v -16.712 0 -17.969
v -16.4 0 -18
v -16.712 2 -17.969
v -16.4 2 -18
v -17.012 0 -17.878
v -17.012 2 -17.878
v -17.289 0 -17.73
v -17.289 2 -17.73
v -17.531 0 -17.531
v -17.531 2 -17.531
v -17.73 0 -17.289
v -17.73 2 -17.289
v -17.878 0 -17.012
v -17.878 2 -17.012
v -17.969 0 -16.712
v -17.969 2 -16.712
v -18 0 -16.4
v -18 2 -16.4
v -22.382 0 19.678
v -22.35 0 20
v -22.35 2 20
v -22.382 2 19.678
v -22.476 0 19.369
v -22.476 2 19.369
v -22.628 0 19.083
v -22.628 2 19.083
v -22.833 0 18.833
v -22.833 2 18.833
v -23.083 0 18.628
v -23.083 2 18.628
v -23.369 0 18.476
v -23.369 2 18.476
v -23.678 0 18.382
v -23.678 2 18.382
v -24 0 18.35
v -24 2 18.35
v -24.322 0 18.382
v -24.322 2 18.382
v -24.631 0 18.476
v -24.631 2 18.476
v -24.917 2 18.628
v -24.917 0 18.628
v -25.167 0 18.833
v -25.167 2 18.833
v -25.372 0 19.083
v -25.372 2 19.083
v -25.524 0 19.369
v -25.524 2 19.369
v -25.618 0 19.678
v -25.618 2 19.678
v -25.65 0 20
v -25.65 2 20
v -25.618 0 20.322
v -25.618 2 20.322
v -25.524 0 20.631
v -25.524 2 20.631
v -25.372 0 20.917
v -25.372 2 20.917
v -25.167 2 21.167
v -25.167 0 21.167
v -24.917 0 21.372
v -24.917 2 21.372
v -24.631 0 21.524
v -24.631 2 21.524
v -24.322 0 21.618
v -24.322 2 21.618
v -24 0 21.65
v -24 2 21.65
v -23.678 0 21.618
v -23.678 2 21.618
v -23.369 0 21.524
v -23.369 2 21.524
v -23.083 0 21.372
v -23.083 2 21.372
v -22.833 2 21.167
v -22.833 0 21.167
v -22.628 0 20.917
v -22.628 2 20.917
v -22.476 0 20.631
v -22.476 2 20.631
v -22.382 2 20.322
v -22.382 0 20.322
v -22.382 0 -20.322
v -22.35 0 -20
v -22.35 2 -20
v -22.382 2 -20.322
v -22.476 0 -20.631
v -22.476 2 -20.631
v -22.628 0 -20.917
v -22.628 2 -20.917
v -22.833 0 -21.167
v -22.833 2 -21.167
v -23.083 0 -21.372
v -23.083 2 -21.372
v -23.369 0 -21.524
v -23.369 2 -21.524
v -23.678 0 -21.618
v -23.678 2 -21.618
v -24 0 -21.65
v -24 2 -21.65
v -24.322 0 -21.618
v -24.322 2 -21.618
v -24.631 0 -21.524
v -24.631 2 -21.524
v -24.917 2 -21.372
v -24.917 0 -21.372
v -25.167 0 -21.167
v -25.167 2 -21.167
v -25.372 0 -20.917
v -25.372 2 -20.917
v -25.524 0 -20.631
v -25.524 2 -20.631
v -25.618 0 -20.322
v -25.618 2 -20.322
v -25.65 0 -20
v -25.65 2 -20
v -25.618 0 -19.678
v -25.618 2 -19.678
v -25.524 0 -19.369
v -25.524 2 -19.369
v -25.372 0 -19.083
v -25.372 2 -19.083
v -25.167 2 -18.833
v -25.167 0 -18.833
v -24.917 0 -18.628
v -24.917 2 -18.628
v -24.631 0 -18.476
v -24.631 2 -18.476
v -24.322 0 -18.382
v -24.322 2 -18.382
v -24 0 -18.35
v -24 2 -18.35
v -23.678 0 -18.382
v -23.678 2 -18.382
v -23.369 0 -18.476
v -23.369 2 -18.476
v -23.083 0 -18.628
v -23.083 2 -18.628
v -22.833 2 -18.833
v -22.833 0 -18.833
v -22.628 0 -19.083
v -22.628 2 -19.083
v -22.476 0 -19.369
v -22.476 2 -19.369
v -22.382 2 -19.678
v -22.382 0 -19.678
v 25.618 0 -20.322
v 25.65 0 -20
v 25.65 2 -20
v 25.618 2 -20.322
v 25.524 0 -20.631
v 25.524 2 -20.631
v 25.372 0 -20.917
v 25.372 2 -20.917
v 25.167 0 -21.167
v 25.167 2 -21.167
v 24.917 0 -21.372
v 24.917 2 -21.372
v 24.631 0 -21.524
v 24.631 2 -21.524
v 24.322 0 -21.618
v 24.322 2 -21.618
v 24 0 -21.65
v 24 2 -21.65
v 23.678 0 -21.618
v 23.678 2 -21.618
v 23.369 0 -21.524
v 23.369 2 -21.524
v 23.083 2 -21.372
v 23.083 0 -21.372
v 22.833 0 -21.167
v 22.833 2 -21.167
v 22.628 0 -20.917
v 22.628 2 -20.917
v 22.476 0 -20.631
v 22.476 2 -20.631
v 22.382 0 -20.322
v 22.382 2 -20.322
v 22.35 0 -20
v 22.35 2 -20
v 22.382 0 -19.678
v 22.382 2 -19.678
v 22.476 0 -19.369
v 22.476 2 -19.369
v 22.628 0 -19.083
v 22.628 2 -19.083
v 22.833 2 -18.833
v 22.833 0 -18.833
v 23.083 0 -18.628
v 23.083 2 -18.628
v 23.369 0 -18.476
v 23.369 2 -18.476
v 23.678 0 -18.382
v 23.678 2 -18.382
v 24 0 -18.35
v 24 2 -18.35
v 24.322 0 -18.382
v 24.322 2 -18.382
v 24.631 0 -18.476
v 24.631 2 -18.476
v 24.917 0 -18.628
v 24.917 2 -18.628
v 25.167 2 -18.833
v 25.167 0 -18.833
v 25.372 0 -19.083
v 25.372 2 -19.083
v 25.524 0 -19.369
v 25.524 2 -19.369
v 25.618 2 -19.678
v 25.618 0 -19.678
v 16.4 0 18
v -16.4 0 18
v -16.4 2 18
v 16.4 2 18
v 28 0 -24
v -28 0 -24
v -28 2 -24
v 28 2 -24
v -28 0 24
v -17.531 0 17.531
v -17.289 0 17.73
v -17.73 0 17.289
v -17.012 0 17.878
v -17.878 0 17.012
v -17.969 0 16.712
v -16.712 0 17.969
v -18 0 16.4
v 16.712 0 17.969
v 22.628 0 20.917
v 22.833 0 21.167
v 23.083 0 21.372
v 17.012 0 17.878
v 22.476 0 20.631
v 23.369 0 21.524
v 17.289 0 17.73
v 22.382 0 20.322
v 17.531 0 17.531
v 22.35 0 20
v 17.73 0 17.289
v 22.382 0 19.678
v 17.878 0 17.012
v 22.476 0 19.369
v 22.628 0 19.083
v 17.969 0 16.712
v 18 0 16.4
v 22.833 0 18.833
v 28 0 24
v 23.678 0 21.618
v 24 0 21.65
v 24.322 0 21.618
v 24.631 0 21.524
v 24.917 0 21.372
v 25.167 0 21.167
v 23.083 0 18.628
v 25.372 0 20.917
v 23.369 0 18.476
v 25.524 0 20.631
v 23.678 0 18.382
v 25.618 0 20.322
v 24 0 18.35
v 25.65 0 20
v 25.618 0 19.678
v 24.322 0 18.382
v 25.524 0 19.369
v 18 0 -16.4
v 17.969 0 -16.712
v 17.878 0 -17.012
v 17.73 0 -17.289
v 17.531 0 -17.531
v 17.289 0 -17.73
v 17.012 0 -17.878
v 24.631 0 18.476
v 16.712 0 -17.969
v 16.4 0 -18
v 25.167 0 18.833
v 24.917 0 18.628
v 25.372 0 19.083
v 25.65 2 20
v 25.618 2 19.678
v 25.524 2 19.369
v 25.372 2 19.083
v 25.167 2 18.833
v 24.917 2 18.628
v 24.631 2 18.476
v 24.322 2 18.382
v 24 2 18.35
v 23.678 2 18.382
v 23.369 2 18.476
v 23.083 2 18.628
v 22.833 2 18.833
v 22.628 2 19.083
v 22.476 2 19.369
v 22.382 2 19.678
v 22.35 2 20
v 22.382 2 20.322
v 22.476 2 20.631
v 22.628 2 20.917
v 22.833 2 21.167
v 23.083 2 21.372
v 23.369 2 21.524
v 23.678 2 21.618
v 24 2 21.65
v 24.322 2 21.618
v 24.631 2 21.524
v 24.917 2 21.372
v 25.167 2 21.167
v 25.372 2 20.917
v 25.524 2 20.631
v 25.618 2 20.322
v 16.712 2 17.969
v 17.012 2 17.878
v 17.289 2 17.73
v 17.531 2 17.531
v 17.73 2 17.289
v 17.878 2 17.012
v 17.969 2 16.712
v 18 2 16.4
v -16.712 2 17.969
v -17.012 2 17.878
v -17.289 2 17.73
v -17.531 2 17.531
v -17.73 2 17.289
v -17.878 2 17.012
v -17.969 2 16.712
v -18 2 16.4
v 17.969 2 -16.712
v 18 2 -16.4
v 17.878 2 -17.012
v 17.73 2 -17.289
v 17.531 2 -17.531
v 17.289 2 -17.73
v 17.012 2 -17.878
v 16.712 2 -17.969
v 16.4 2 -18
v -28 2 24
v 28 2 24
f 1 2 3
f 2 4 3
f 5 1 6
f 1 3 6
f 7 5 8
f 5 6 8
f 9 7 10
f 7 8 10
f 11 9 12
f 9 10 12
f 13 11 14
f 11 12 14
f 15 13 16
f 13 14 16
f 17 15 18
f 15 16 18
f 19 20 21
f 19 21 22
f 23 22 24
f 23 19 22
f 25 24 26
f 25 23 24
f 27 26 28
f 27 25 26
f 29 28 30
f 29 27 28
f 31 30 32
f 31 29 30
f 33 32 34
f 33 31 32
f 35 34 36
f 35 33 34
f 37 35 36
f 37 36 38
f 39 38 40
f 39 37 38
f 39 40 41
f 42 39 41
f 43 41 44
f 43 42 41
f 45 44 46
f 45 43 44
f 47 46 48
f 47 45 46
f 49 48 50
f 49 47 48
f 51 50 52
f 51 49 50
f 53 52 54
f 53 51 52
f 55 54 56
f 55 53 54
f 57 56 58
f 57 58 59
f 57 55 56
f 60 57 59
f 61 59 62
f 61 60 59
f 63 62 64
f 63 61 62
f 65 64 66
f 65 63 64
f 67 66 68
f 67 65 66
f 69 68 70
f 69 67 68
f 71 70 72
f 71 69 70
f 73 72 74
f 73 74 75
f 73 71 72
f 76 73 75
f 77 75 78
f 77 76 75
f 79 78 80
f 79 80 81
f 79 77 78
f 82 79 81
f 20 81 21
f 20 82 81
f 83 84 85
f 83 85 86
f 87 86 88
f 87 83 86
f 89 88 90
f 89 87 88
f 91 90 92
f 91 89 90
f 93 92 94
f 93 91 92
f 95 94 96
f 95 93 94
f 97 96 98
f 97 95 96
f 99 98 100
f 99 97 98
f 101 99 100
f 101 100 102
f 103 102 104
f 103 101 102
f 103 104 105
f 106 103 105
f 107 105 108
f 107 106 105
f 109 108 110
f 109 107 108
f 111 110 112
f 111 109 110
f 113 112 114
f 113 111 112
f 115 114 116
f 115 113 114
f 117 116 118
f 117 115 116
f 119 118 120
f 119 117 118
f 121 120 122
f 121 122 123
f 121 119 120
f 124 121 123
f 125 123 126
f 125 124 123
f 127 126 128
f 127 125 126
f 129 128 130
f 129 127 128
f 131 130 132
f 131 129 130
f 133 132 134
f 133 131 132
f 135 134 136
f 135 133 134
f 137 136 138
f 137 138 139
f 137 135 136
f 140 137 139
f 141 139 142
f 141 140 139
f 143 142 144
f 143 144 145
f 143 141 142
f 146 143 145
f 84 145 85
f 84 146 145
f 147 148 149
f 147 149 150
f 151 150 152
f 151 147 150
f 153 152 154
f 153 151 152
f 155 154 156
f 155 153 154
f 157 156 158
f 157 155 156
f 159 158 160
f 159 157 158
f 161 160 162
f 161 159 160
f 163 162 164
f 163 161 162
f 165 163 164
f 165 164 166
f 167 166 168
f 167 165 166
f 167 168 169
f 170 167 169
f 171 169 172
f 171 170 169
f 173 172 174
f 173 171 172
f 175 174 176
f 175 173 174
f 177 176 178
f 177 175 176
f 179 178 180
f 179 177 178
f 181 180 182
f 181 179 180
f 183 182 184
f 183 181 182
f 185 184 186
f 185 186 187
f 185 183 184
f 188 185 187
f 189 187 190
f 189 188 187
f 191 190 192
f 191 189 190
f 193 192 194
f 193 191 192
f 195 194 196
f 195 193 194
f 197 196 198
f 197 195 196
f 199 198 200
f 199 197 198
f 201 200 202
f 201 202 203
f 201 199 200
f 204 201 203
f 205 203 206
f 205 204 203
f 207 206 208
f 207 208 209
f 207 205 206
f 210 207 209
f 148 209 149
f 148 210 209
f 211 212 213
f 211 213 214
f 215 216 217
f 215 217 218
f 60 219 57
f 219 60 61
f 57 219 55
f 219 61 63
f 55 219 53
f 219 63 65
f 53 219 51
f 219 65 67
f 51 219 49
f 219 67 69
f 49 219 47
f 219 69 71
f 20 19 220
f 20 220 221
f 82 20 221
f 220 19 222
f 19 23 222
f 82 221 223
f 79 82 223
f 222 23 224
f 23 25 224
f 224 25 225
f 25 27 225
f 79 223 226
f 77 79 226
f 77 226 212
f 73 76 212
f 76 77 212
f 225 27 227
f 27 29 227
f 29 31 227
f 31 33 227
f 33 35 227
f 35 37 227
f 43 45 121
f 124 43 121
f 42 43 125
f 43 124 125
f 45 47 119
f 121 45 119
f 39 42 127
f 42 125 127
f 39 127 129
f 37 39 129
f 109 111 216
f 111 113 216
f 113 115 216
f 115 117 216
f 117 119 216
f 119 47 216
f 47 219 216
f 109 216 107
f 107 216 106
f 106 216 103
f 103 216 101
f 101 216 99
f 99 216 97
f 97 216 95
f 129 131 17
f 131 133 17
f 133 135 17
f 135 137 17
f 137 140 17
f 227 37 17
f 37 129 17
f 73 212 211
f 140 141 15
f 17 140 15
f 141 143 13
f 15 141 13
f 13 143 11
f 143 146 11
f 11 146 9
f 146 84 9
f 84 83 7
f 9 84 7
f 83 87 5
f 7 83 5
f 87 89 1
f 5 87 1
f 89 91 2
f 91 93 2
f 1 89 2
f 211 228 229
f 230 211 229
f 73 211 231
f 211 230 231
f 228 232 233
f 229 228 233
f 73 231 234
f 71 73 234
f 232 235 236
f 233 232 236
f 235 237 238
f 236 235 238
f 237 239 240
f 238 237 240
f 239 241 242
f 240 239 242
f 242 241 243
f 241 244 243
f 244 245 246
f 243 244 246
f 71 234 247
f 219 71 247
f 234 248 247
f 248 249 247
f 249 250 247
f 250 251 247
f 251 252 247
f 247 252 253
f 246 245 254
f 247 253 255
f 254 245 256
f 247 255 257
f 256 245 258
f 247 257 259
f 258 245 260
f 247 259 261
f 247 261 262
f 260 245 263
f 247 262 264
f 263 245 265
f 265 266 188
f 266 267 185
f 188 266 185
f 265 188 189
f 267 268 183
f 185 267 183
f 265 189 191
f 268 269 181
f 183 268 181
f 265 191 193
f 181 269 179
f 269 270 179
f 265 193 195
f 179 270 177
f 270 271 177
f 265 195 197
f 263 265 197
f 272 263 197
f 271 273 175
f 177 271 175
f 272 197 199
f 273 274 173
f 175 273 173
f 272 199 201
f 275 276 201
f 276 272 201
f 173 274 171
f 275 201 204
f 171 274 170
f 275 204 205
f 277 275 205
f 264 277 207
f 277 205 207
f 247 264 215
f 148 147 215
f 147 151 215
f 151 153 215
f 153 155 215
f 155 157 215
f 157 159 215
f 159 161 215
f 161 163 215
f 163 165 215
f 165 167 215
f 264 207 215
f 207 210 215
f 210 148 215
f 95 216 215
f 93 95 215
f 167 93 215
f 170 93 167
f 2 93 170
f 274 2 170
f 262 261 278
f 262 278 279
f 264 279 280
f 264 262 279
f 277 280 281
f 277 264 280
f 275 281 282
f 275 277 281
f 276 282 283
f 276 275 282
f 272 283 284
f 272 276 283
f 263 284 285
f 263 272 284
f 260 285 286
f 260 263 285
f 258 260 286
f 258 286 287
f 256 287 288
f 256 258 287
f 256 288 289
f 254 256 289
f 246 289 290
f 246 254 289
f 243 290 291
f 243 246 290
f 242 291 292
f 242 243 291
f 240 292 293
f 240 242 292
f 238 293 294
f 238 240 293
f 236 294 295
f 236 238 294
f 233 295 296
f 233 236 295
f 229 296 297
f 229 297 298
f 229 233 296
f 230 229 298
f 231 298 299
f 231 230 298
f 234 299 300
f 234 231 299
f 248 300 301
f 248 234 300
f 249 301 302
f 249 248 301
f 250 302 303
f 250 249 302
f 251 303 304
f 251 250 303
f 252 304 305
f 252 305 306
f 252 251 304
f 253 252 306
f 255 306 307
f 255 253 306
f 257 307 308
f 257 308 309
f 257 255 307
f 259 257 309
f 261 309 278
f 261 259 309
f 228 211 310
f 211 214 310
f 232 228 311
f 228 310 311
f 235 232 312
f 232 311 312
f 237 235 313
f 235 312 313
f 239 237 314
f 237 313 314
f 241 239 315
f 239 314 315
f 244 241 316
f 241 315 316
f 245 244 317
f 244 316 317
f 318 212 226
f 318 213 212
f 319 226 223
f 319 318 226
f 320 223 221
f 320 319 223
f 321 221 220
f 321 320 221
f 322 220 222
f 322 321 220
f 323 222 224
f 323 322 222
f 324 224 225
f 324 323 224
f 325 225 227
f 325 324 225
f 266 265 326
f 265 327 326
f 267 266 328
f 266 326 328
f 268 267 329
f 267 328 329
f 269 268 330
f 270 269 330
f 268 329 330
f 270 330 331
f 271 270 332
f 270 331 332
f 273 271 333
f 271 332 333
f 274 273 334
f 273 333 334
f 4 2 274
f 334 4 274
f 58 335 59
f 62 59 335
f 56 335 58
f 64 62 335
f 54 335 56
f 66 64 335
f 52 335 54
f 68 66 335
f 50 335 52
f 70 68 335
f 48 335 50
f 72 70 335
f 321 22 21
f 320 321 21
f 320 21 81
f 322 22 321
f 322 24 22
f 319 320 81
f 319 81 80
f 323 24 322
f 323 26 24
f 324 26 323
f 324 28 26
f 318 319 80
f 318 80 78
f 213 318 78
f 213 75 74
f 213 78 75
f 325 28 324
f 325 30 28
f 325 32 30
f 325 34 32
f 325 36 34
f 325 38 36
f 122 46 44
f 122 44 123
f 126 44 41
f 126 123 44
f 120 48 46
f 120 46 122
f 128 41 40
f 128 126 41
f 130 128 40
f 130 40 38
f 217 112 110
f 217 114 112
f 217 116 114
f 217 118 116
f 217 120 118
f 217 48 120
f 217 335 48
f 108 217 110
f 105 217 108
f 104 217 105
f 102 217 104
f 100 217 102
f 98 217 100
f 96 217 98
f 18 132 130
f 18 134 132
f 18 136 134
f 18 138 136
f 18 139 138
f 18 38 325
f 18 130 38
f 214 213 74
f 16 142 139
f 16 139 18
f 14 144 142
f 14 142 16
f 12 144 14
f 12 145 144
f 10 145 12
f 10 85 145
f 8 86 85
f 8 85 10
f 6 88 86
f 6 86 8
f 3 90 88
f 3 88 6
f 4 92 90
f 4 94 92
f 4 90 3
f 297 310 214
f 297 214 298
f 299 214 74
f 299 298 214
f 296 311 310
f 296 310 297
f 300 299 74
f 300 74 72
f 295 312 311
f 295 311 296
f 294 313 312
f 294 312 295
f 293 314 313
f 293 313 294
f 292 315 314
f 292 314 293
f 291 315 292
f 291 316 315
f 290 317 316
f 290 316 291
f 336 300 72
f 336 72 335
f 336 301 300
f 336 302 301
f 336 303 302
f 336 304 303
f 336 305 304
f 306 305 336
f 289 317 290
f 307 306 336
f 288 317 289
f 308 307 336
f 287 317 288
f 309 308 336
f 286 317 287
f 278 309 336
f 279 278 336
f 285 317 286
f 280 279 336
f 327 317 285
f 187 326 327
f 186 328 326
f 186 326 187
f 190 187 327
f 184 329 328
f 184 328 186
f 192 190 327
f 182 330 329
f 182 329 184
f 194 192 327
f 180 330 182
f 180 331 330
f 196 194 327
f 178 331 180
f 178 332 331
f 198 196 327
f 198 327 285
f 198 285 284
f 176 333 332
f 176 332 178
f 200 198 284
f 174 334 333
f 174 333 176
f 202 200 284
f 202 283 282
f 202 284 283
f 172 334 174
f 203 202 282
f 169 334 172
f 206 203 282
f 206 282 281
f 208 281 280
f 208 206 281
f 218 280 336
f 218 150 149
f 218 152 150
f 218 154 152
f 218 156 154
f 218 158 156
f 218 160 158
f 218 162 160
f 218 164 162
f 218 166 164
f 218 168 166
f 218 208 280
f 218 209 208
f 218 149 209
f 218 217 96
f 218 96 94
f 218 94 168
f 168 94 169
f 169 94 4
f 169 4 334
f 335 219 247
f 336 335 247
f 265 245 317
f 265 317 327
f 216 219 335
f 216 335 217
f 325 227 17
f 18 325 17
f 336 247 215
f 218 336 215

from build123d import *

# Parameters (mm, degrees)
SKETCH1_W           = 56
SKETCH1_H           = 48
SKETCH1_R           = 1.65
SKETCH1_W_2         = 36
SKETCH1_H_2         = 36
BOSS_EXTRUDE1_DEPTH = 2
FILLET1_R           = 1.6


with BuildPart() as part:
    # Sketch1 → Boss-Extrude1 (new body)
    with BuildSketch(Plane(origin=(0, 0, 0), x_dir=(1, 0, 0), z_dir=(0, 1, 0))):
        Rectangle(SKETCH1_W, SKETCH1_H)
        with Locations((-24, 20)):
            Circle(SKETCH1_R, mode=Mode.SUBTRACT)
        with Locations((-24, -20)):
            Circle(SKETCH1_R, mode=Mode.SUBTRACT)
        with Locations((24, 20)):
            Circle(SKETCH1_R, mode=Mode.SUBTRACT)
        with Locations((24, -20)):
            Circle(SKETCH1_R, mode=Mode.SUBTRACT)
        Rectangle(SKETCH1_W_2, SKETCH1_H_2, mode=Mode.SUBTRACT)
    extrude(amount=BOSS_EXTRUDE1_DEPTH)

    # Fillet1
    fillet1_edges = [part.edges().sort_by_distance(p)[0] for p in [
        (18, 1, -18),
        (-18, 1, -18),
        (-18, 1, 18),
        (18, 1, 18),
    ]]
    fillet(fillet1_edges, radius=FILLET1_R)


solid = part.part
